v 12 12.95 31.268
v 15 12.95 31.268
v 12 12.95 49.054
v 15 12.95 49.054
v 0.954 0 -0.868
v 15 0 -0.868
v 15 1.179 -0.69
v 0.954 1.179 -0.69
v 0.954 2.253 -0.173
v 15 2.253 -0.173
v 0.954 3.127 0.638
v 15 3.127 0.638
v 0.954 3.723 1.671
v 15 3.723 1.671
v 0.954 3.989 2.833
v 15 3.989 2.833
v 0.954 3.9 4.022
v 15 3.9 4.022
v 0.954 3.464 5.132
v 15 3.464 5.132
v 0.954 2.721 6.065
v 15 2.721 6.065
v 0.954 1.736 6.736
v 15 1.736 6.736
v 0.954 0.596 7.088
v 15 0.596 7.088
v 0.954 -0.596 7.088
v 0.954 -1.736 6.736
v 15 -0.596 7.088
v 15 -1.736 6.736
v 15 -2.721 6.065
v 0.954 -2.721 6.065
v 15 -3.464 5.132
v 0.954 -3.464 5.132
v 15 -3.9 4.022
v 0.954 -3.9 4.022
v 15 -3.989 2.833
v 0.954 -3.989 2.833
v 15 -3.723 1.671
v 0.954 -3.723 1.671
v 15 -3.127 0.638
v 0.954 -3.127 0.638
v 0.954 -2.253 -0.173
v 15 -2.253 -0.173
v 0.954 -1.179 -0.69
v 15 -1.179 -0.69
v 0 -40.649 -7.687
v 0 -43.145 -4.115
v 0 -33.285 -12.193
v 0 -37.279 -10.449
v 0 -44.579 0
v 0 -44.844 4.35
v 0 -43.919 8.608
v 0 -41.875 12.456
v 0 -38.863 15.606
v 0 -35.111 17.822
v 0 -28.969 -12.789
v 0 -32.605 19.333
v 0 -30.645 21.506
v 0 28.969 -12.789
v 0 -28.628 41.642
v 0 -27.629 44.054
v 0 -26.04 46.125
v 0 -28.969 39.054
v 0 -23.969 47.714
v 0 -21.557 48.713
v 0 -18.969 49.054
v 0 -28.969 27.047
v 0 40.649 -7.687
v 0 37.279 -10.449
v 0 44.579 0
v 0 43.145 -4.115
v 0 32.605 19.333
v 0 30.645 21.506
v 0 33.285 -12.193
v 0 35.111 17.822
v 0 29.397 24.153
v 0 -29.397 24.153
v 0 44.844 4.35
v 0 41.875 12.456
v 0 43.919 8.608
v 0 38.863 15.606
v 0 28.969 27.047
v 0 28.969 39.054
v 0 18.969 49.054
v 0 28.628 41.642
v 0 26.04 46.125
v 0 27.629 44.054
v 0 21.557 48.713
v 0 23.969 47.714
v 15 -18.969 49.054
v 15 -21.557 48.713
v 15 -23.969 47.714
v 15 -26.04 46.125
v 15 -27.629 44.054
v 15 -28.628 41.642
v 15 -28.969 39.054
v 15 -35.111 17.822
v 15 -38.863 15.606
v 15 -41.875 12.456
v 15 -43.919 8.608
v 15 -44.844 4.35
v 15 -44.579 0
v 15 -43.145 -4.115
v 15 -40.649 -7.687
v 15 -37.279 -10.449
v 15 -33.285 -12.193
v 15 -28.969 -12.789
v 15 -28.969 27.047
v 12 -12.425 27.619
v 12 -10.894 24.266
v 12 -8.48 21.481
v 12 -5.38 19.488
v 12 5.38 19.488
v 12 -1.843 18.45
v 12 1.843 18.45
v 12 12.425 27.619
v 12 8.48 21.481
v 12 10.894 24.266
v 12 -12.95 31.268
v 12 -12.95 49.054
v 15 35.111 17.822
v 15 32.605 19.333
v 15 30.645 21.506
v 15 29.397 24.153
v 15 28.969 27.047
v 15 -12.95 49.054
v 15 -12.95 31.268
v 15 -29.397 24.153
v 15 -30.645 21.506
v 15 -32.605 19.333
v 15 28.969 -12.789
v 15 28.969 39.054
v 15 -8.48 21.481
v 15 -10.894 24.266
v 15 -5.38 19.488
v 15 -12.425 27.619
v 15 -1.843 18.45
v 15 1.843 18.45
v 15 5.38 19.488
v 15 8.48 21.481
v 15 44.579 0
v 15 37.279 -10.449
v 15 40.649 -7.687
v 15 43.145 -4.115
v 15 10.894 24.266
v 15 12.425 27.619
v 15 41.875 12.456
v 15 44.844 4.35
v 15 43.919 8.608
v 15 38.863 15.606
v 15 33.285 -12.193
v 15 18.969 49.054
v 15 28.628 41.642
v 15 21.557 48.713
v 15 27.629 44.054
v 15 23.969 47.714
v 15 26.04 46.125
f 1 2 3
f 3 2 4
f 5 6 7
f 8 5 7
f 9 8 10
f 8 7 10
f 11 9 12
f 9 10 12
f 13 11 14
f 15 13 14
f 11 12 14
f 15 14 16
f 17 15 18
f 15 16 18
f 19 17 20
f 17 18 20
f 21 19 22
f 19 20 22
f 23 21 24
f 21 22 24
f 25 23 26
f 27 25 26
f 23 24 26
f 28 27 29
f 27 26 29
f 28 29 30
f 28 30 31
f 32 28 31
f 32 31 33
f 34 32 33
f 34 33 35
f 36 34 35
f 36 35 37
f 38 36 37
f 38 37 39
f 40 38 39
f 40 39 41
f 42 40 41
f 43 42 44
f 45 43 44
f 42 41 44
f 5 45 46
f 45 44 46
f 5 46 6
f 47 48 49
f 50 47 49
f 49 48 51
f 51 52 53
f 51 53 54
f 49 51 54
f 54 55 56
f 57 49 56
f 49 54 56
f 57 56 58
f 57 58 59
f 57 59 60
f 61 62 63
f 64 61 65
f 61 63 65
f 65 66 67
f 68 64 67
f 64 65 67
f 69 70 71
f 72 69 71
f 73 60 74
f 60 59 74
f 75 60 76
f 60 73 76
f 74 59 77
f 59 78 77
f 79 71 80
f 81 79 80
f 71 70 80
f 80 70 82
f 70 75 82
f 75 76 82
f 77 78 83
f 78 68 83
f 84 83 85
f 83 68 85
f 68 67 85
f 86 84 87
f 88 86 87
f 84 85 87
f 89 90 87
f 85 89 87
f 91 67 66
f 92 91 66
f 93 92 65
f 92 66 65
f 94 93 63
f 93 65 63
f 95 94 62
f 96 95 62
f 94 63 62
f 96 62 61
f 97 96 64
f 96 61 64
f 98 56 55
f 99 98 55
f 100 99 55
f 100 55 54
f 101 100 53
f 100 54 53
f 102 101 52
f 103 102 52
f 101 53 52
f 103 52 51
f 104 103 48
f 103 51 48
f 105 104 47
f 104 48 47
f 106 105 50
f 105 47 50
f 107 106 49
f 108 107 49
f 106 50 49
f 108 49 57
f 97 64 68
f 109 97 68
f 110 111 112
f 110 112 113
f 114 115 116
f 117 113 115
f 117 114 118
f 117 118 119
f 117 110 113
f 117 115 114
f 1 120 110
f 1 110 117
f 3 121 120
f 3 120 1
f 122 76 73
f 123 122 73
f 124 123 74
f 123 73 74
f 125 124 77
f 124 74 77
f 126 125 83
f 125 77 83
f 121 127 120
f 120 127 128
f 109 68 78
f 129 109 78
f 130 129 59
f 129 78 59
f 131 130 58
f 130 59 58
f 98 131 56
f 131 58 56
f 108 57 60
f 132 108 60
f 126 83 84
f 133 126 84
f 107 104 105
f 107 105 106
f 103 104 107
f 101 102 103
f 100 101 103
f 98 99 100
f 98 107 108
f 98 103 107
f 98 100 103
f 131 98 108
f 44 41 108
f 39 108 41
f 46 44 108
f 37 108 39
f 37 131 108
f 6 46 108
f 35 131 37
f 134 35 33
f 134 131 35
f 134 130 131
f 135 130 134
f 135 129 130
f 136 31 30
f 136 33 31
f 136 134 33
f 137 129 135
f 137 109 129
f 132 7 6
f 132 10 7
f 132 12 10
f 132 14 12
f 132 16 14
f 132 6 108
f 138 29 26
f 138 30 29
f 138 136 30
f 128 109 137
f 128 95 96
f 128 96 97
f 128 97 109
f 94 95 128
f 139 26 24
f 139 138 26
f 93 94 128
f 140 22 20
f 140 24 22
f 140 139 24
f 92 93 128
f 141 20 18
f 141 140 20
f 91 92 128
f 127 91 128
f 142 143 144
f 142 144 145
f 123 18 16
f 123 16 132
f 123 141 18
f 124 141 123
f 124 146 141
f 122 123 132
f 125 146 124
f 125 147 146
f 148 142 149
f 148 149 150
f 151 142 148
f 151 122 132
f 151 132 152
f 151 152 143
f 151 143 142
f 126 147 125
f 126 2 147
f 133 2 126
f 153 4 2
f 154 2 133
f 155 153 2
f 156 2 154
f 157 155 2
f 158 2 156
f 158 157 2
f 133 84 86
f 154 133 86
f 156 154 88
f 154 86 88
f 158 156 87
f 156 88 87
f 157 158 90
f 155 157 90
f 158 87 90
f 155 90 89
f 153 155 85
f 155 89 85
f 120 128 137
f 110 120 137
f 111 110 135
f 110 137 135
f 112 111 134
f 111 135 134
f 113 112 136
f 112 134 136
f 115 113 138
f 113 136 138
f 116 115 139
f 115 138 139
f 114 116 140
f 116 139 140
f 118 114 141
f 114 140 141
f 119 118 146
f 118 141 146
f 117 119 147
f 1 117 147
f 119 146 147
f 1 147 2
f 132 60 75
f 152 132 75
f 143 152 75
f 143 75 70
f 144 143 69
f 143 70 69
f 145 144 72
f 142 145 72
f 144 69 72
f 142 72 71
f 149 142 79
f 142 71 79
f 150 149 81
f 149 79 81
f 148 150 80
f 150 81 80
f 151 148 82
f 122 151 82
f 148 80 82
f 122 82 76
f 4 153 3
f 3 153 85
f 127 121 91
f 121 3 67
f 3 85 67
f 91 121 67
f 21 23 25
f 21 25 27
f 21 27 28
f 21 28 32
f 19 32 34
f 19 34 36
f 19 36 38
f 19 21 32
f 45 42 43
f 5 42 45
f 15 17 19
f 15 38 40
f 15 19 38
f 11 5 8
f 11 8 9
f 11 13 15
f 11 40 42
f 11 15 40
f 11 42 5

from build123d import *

# Parameters (mm, degrees)
BOSS_EXTRUDE3_DEPTH = 15
SKETCH3_R           = 4
CUT_EXTRUDE3_DEPTH  = 14.0462
CUT_EXTRUDE4_DEPTH  = 3


with BuildPart() as part:
    # Sketch1 → Boss-Extrude3 (new body)
    with BuildSketch(Plane.YZ):
        with BuildLine():
            Line((-28.968617751, -12.789334175), (28.968617751, -12.789334175))
            ThreePointArc((28.968617751, -12.789334175), (44.579120821, 0), (35.110840206, 17.821518929))
            ThreePointArc((35.110840206, 17.821518929), (30.644623053, 21.505675602), (28.968617751, 27.047436358))
            Line((28.968617751, 27.047436358), (28.968617751, 39.053986921))
            ThreePointArc((28.968617751, 39.053986921), (26.039685563, 46.125054733), (18.968617751, 49.053986921))
            Line((18.968617751, 49.053986921), (-18.968617751, 49.053986921))
            ThreePointArc((-18.968617751, 49.053986921), (-26.039685563, 46.125054733), (-28.968617751, 39.053986921))
            Line((-28.968617751, 39.053986921), (-28.968617751, 27.047436358))
            ThreePointArc((-28.968617751, 27.047436358), (-30.644623053, 21.505675602), (-35.110840206, 17.821518929))
            ThreePointArc((-35.110840206, 17.821518929), (-44.579120821, 0), (-28.968617751, -12.789334175))
        make_face()
    extrude(amount=BOSS_EXTRUDE3_DEPTH)

    # Sketch3 → Cut-Extrude3 (cut)
    with BuildSketch(Plane.YZ.offset(15)):
        with Locations(Location((0, 3.132326373, 0), (0, 0, 270))):
            Circle(SKETCH3_R)
    extrude(amount=-CUT_EXTRUDE3_DEPTH, mode=Mode.SUBTRACT)

    # Sketch4 → Cut-Extrude4 (cut)
    with BuildSketch(Plane.YZ.offset(15)):
        with BuildLine():
            Line((-12.95, 49.053986921), (-12.95, 31.267703884))
            ThreePointArc((-12.95, 31.267703884), (0, 18.317703884), (12.95, 31.267703884))
            Line((12.95, 31.267703884), (12.95, 49.053986921))
            Line((12.95, 49.053986921), (-12.95, 49.053986921))
        make_face()
    extrude(amount=-CUT_EXTRUDE4_DEPTH, mode=Mode.SUBTRACT)


solid = part.part
